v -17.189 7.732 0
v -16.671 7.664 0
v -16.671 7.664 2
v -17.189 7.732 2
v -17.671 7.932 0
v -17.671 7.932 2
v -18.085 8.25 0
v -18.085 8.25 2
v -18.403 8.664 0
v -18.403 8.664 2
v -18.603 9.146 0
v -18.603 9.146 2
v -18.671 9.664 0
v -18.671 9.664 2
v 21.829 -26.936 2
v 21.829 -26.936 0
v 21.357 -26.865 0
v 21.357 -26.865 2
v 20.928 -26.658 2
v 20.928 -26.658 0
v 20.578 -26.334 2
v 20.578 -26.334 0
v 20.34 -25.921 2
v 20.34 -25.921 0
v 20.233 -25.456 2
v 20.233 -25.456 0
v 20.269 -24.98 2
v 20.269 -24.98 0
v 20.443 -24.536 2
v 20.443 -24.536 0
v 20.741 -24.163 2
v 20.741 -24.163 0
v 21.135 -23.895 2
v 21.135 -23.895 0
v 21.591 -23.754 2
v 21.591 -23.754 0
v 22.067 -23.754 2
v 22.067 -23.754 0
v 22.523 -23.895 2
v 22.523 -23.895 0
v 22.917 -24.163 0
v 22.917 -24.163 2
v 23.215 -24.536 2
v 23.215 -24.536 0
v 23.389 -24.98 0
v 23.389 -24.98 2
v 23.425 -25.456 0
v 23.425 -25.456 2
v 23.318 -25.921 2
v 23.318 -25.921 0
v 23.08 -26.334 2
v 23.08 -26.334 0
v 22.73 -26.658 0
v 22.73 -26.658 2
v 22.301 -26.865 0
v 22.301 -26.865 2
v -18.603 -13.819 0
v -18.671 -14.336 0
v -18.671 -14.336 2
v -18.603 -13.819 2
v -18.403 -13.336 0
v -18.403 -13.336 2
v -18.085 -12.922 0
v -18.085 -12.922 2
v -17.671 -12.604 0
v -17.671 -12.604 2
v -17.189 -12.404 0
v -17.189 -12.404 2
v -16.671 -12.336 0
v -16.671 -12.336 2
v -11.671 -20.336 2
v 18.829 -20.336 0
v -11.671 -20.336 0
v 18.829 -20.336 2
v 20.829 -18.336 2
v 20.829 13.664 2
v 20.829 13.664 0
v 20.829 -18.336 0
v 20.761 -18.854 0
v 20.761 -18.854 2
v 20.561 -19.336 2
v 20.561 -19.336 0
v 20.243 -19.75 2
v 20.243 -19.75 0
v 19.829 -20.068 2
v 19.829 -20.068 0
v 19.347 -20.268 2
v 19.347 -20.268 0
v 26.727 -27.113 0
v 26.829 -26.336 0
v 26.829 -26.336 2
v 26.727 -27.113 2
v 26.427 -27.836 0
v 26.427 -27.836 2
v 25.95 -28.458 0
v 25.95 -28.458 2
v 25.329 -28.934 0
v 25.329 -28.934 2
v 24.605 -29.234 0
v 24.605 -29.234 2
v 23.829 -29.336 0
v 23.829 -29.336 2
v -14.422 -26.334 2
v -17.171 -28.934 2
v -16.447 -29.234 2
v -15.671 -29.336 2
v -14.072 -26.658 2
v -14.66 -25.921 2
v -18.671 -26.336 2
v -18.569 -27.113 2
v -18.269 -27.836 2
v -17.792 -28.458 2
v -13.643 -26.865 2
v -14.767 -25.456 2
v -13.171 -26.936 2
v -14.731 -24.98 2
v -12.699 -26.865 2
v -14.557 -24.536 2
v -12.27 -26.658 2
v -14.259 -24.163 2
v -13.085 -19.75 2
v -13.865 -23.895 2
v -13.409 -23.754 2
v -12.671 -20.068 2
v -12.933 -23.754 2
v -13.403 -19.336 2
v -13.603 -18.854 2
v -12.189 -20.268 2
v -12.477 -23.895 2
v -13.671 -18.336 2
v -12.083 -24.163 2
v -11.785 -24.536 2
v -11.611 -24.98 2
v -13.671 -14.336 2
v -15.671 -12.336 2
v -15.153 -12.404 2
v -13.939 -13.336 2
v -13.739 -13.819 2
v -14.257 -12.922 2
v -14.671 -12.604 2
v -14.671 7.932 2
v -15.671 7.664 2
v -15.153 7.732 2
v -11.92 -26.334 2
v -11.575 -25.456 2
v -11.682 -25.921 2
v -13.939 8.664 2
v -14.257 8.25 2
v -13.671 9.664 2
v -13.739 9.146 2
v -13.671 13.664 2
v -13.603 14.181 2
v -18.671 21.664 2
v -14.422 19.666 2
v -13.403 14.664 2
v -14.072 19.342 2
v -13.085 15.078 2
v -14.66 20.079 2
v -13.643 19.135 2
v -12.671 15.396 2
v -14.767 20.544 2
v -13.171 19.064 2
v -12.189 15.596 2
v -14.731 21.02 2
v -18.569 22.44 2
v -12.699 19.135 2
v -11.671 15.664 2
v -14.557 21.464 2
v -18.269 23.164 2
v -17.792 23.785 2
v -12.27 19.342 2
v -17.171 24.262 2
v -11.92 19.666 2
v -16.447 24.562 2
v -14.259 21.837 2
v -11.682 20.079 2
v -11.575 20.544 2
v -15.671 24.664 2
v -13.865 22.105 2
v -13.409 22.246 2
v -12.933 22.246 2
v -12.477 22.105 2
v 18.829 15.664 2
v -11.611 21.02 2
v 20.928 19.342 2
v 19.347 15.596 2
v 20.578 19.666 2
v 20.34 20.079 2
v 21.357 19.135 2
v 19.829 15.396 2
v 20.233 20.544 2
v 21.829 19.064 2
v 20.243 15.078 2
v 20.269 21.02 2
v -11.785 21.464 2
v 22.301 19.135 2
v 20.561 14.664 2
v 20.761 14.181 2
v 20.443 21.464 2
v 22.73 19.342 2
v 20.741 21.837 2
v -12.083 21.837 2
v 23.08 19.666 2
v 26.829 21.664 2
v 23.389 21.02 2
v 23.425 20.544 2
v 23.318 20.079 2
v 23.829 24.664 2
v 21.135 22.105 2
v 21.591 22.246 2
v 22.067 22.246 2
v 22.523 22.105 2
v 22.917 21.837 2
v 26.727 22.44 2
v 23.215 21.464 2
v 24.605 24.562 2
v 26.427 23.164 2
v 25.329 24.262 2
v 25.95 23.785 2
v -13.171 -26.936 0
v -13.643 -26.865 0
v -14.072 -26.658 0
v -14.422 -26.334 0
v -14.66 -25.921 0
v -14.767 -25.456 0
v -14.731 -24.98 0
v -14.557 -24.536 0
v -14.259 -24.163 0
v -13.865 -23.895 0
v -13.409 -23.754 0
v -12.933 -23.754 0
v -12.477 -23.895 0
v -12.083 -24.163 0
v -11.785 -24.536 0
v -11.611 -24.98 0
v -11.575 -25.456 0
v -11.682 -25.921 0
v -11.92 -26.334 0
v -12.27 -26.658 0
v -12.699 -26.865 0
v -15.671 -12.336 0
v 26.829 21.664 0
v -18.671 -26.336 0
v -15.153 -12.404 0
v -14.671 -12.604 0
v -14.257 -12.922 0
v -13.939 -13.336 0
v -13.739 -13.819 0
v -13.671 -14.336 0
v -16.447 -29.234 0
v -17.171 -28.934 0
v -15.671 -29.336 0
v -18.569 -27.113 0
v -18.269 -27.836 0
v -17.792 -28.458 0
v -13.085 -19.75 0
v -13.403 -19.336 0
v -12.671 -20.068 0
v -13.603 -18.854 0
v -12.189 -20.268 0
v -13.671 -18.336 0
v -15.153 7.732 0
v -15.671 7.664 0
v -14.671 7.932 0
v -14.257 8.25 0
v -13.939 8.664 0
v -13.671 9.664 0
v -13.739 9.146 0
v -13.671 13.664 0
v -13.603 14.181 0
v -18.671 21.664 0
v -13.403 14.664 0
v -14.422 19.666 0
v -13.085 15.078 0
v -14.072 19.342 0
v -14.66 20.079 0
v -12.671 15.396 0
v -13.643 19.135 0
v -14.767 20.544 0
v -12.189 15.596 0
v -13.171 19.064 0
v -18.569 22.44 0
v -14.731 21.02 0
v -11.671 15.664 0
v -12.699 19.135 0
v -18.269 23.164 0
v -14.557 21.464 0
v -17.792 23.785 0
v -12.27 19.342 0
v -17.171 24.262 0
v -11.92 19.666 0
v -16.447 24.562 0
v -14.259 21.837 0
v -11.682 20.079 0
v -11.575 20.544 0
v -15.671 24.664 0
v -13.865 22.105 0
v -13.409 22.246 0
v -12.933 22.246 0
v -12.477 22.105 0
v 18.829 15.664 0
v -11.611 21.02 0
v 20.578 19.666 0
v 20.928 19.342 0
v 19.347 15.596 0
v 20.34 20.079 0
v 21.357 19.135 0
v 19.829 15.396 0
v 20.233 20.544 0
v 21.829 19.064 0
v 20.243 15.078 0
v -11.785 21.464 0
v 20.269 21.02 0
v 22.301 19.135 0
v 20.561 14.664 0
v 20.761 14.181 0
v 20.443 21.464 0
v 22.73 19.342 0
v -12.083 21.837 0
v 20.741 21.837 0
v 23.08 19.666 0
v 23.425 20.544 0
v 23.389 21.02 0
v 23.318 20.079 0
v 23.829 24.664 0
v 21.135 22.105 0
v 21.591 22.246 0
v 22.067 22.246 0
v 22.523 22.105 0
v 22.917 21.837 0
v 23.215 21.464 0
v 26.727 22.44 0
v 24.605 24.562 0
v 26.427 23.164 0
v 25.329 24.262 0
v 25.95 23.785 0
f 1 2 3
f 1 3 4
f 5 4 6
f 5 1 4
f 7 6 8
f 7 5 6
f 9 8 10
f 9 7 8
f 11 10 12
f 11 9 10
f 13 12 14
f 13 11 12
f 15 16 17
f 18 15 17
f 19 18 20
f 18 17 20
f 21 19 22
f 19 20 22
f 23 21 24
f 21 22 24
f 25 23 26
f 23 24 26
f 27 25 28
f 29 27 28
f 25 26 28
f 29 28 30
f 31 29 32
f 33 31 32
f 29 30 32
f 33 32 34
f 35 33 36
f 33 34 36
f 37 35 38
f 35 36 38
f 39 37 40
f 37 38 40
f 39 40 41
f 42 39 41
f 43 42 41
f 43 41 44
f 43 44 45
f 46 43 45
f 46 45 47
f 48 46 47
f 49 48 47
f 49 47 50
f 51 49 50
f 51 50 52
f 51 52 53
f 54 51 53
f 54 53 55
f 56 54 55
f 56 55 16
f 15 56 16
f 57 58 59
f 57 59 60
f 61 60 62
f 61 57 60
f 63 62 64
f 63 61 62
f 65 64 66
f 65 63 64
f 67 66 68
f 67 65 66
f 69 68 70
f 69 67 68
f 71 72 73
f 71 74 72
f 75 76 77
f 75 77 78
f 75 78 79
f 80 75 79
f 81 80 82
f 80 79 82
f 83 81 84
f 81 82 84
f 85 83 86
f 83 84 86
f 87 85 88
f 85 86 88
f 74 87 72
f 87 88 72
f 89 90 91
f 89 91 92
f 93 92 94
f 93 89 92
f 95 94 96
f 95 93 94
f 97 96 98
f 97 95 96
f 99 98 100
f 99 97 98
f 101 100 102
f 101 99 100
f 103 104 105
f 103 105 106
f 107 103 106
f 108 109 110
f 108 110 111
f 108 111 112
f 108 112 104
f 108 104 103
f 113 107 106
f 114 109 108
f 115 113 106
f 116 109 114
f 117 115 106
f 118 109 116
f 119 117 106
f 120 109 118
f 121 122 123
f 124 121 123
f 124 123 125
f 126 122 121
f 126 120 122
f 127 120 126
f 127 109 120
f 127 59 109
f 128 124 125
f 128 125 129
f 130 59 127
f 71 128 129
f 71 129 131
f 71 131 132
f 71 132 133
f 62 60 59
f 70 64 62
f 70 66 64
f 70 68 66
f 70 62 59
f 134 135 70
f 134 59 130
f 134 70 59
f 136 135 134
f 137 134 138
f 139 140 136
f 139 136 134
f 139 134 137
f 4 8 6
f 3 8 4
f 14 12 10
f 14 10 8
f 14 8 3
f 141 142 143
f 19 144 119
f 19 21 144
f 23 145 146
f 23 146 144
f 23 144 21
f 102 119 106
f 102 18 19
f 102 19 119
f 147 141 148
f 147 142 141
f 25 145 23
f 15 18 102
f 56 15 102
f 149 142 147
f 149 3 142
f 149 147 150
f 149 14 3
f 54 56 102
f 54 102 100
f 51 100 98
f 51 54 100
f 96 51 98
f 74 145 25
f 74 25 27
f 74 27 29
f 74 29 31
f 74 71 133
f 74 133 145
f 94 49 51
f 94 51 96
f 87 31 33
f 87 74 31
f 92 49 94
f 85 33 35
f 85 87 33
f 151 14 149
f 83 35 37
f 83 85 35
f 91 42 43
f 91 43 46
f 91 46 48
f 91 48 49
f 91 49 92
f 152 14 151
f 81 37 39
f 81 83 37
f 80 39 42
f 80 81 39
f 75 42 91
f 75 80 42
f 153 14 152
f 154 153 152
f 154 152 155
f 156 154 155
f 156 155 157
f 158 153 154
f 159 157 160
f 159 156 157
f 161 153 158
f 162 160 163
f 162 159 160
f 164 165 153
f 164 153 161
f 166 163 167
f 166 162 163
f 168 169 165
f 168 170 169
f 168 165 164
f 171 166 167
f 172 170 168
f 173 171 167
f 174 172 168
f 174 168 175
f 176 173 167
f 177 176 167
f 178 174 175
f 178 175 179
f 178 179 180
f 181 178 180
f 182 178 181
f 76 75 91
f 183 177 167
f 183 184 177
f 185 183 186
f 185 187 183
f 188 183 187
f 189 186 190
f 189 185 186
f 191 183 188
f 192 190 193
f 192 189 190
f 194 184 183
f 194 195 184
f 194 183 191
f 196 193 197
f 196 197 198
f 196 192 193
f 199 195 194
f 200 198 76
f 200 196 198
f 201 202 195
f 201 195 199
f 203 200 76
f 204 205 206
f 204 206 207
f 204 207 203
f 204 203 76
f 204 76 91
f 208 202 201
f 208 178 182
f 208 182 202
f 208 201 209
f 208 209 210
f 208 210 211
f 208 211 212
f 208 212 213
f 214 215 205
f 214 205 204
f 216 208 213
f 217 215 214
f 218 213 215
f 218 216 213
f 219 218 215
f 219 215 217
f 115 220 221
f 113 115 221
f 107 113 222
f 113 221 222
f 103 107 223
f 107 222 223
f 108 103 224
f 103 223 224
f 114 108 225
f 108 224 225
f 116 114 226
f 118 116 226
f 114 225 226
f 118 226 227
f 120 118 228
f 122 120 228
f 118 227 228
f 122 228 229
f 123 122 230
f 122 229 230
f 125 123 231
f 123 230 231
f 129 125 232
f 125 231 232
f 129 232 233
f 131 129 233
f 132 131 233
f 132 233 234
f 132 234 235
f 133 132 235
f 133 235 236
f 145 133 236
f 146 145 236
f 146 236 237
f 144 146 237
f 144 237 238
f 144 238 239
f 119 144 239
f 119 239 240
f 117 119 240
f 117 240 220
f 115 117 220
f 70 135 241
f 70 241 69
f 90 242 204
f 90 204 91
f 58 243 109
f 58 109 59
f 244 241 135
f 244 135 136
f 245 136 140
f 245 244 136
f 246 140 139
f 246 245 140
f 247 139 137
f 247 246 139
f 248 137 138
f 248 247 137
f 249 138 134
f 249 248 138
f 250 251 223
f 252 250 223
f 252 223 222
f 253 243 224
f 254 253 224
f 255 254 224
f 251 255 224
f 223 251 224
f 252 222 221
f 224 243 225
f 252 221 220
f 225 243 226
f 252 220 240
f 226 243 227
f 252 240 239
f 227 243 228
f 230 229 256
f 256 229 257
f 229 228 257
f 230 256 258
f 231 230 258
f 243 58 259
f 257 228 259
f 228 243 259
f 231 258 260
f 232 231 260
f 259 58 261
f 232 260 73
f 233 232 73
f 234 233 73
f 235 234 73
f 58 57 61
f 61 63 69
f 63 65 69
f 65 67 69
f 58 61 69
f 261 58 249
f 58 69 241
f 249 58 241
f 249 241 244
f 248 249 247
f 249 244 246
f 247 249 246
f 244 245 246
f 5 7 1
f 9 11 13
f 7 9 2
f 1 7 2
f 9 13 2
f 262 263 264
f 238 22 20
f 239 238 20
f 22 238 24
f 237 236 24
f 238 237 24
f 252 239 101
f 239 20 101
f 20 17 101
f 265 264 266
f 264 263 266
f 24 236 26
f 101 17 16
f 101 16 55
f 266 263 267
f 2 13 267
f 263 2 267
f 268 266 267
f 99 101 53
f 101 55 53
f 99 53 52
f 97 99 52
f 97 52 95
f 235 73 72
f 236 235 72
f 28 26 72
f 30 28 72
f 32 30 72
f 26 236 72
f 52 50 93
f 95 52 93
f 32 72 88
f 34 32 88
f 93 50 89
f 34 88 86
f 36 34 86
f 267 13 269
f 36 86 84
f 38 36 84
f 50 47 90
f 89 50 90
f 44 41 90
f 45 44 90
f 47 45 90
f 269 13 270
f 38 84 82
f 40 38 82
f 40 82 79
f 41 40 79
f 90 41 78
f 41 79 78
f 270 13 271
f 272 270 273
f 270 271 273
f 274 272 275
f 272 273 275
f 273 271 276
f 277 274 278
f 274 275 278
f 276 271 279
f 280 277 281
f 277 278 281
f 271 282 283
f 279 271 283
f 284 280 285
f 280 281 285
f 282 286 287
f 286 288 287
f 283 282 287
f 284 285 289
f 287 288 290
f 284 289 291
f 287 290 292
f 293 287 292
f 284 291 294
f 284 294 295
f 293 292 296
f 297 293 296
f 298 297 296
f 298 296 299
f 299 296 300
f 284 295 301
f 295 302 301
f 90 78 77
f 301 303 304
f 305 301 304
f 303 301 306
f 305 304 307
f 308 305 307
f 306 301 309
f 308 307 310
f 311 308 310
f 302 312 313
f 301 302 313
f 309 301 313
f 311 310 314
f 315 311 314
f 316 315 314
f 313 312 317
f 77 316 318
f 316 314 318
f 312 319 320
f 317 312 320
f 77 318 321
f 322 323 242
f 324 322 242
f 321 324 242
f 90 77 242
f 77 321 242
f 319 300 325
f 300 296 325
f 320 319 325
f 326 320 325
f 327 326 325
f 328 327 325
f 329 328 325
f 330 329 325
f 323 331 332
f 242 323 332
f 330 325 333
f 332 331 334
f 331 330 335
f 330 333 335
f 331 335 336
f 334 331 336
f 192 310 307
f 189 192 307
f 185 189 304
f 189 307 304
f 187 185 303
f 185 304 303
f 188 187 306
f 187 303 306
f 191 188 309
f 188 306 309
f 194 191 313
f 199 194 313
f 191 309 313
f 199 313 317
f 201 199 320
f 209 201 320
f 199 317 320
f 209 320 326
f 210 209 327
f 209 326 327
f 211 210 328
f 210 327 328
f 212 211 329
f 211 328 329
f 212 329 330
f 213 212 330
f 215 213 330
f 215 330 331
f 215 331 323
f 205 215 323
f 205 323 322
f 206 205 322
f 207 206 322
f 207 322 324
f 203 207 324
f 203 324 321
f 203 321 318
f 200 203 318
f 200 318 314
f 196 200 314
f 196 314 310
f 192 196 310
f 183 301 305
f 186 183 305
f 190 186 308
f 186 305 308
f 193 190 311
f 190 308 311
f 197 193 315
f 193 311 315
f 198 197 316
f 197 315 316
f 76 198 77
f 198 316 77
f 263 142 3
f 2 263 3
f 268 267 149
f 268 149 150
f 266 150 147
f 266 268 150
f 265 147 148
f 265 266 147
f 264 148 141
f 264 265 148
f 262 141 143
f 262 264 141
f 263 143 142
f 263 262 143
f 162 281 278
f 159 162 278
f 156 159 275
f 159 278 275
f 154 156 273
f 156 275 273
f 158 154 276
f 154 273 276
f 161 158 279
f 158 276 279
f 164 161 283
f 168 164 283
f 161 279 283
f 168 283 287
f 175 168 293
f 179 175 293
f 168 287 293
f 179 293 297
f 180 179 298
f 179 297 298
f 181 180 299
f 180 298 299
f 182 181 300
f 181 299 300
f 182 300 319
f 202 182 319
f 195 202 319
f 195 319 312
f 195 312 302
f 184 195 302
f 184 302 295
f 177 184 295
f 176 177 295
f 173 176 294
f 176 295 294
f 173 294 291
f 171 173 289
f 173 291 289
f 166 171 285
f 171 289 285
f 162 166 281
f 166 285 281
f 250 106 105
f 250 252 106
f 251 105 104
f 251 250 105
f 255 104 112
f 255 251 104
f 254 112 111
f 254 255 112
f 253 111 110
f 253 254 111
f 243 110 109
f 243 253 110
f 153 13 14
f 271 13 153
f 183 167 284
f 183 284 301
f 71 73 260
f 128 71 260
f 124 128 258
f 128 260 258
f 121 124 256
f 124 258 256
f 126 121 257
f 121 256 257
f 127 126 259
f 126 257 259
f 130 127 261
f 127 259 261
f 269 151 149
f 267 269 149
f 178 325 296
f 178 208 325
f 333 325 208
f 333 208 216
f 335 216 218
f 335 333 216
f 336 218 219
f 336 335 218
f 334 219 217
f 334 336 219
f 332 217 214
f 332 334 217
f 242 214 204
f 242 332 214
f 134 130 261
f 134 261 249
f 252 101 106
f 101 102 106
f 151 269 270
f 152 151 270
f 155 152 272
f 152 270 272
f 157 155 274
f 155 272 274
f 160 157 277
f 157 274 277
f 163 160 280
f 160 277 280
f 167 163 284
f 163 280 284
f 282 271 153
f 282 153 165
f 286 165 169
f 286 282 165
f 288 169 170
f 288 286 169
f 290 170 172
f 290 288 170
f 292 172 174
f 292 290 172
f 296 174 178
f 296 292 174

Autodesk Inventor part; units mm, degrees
ref_plane "YZ Plane" through (0, 0, 0) normal (1, 0, 0) x (0, 1, 0)
ref_plane "XZ Plane" through (0, 0, 0) normal (0, 1, 0) x (-1, 0, 0)
ref_plane "XY Plane" through (0, 0, 0) normal (0, 0, 1) x (1, 0, 0)
sketch "Sketch1" plane through (0, 0, 0) normal (0, 0, 1) x (1, 0, 0)
  line L0 (-18.671, 23.6638) -> (26.829, 23.6638)
  line L1 (26.829, 23.6638) -> (26.829, -28.3362)
  line L2 (26.829, -28.3362) -> (-18.671, -28.3362)
  line L3 (-18.671, -28.3362) -> (-18.671, 23.6638)
  point P0 (0, 0)
  dimension "d0" = 52
  dimension "d1" = 45.5
extrude "Extrusion1" add sketch "Sketch1" along normal blind 2
sketch "Sketch2" plane through (0, 0, 2) normal (0, 0, 1) x (1, 0, 0)
  line L0 (-18.671, -28.3362) -> (26.829, -28.3362) projected
  line L1 (26.829, -28.3362) -> (26.829, 23.6638) projected
  line L2 (26.829, 23.6638) -> (-18.671, 23.6638) projected
  point P0 (0, 0)
  point P1 (-13.171, 20.6638)
  point P2 (21.829, 20.6638)
  point P3 (21.829, -25.3362)
  point P4 (-13.171, -25.3362)
  point P5 (23.829, -28.3362)
  point P6 (26.829, -25.3362)
  point P7 (26.829, 20.6638)
  point P8 (23.829, 23.6638)
  dimension "d5" = 35
  dimension "d6" = 35
  dimension "d7" = 46
  dimension "d8" = 3
  dimension "d9" = 3
  dimension "d10" = 5
  dimension "d11" = 5
  dimension "d12" = 3
hole "Hole1" at (-13.171, 20.6638, 2) at (21.829, 20.6638, 2) at (21.829, -25.3362, 2) at (-13.171, -25.3362, 2) direction (0, 0, -1) diameter 3.2 depth 10 tip angle 118
sketch "Sketch3" plane through (0, 0, 2) normal (0, 0, 1) x (1, 0, 0)
  line L0 (-18.671, 23.6638) -> (-18.671, -28.3362) projected
  line L1 (-18.671, 15.6638) -> (20.829, 15.6638)
  line L2 (20.829, 15.6638) -> (20.829, -20.3362)
  line L3 (20.829, -20.3362) -> (-18.671, -20.3362)
  line L4 (-18.671, -20.3362) -> (-18.671, 15.6638)
  circle A0 centre (-13.171, 20.6638) radius 1.6 projected
  line L5 (26.829, -28.3362) -> (26.829, 23.6638) projected
  circle A1 centre (-13.171, -25.3362) radius 1.6 projected
  point P0 (0, 0)
  point P1 (26.829, -25.3362)
  point P2 (26.829, 20.6638)
  dimension "d20" = 5
  dimension "d21" = 6
  dimension "d22" = 5
extrude "Extrusion2" cut sketch "Sketch3" against normal blind 2 contours L1 L2 L3 L0
sketch "Sketch4" plane through (0, 0, 2) normal (0, 0, 1) x (1, 0, 0)
  line L0 (-18.671, 15.6638) -> (20.829, 15.6638) projected
  line L1 (-18.671, 15.6638) -> (-13.671, 15.6638)
  line L2 (-13.671, 15.6638) -> (-13.671, 7.6638)
  line L3 (-13.671, 7.6638) -> (-18.671, 7.6638)
  line L4 (-18.671, 7.6638) -> (-18.671, 15.6638)
  line L5 (-18.671, -20.3362) -> (-18.671, -28.3362) projected
  line L6 (-18.671, -20.3362) -> (-13.671, -20.3362)
  line L7 (-13.671, -20.3362) -> (-13.671, -12.3362)
  line L8 (-13.671, -12.3362) -> (-18.671, -12.3362)
  line L9 (-18.671, -12.3362) -> (-18.671, -20.3362)
  point P0 (0, 0)
  point P1 (17.829, 15.6638)
  point P2 (-18.671, -25.3362)
  dimension "d27" = 8
  dimension "d28" = 8
  dimension "d29" = 5
extrude "Extrusion3" add sketch "Sketch4" against normal blind 2
fillet "Fillet5" radius 2 4 edges at (-13.671, 7.6638, 1) (-18.671, 7.6638, 1) (-18.671, -12.3362, 1) (-13.671, -12.3362, 1)
sketch "Sketch5" plane through (0, 0, 2) normal (0, 0, 1) x (1, 0, 0)
  line L0 (26.829, 23.6638) -> (-18.671, 23.6638) projected
  line L1 (-18.671, 23.6638) -> (26.829, 23.6638)
  line L2 (26.829, 23.6638) -> (26.829, 24.6638)
  line L3 (26.829, 24.6638) -> (-18.671, 24.6638)
  line L4 (-18.671, 24.6638) -> (-18.671, 23.6638)
  line L5 (-18.671, -28.3362) -> (26.829, -28.3362) projected
  line L6 (-18.671, -28.3362) -> (26.829, -28.3362)
  line L7 (26.829, -28.3362) -> (26.829, -29.3362)
  line L8 (26.829, -29.3362) -> (-18.671, -29.3362)
  line L9 (-18.671, -29.3362) -> (-18.671, -28.3362)
  line L10 (26.829, -28.3362) -> (26.829, 23.6638) projected
  point P0 (0, 0)
  dimension "d37" = 1
  dimension "d38" = 1
extrude "Extrusion4" add sketch "Sketch5" against normal blind 2
fillet "Fillet6" radius 3 4 edges at (-18.671, 24.6638, 1) (26.829, 24.6638, 1) (26.829, -29.3362, 1) (-18.671, -29.3362, 1)
fillet "Fillet7" radius 2 4 edges at (-13.671, 15.6638, 1) (20.829, 15.6638, 1) (20.829, -20.3362, 1) (-13.671, -20.3362, 1)
properties part number "wood_supp"
